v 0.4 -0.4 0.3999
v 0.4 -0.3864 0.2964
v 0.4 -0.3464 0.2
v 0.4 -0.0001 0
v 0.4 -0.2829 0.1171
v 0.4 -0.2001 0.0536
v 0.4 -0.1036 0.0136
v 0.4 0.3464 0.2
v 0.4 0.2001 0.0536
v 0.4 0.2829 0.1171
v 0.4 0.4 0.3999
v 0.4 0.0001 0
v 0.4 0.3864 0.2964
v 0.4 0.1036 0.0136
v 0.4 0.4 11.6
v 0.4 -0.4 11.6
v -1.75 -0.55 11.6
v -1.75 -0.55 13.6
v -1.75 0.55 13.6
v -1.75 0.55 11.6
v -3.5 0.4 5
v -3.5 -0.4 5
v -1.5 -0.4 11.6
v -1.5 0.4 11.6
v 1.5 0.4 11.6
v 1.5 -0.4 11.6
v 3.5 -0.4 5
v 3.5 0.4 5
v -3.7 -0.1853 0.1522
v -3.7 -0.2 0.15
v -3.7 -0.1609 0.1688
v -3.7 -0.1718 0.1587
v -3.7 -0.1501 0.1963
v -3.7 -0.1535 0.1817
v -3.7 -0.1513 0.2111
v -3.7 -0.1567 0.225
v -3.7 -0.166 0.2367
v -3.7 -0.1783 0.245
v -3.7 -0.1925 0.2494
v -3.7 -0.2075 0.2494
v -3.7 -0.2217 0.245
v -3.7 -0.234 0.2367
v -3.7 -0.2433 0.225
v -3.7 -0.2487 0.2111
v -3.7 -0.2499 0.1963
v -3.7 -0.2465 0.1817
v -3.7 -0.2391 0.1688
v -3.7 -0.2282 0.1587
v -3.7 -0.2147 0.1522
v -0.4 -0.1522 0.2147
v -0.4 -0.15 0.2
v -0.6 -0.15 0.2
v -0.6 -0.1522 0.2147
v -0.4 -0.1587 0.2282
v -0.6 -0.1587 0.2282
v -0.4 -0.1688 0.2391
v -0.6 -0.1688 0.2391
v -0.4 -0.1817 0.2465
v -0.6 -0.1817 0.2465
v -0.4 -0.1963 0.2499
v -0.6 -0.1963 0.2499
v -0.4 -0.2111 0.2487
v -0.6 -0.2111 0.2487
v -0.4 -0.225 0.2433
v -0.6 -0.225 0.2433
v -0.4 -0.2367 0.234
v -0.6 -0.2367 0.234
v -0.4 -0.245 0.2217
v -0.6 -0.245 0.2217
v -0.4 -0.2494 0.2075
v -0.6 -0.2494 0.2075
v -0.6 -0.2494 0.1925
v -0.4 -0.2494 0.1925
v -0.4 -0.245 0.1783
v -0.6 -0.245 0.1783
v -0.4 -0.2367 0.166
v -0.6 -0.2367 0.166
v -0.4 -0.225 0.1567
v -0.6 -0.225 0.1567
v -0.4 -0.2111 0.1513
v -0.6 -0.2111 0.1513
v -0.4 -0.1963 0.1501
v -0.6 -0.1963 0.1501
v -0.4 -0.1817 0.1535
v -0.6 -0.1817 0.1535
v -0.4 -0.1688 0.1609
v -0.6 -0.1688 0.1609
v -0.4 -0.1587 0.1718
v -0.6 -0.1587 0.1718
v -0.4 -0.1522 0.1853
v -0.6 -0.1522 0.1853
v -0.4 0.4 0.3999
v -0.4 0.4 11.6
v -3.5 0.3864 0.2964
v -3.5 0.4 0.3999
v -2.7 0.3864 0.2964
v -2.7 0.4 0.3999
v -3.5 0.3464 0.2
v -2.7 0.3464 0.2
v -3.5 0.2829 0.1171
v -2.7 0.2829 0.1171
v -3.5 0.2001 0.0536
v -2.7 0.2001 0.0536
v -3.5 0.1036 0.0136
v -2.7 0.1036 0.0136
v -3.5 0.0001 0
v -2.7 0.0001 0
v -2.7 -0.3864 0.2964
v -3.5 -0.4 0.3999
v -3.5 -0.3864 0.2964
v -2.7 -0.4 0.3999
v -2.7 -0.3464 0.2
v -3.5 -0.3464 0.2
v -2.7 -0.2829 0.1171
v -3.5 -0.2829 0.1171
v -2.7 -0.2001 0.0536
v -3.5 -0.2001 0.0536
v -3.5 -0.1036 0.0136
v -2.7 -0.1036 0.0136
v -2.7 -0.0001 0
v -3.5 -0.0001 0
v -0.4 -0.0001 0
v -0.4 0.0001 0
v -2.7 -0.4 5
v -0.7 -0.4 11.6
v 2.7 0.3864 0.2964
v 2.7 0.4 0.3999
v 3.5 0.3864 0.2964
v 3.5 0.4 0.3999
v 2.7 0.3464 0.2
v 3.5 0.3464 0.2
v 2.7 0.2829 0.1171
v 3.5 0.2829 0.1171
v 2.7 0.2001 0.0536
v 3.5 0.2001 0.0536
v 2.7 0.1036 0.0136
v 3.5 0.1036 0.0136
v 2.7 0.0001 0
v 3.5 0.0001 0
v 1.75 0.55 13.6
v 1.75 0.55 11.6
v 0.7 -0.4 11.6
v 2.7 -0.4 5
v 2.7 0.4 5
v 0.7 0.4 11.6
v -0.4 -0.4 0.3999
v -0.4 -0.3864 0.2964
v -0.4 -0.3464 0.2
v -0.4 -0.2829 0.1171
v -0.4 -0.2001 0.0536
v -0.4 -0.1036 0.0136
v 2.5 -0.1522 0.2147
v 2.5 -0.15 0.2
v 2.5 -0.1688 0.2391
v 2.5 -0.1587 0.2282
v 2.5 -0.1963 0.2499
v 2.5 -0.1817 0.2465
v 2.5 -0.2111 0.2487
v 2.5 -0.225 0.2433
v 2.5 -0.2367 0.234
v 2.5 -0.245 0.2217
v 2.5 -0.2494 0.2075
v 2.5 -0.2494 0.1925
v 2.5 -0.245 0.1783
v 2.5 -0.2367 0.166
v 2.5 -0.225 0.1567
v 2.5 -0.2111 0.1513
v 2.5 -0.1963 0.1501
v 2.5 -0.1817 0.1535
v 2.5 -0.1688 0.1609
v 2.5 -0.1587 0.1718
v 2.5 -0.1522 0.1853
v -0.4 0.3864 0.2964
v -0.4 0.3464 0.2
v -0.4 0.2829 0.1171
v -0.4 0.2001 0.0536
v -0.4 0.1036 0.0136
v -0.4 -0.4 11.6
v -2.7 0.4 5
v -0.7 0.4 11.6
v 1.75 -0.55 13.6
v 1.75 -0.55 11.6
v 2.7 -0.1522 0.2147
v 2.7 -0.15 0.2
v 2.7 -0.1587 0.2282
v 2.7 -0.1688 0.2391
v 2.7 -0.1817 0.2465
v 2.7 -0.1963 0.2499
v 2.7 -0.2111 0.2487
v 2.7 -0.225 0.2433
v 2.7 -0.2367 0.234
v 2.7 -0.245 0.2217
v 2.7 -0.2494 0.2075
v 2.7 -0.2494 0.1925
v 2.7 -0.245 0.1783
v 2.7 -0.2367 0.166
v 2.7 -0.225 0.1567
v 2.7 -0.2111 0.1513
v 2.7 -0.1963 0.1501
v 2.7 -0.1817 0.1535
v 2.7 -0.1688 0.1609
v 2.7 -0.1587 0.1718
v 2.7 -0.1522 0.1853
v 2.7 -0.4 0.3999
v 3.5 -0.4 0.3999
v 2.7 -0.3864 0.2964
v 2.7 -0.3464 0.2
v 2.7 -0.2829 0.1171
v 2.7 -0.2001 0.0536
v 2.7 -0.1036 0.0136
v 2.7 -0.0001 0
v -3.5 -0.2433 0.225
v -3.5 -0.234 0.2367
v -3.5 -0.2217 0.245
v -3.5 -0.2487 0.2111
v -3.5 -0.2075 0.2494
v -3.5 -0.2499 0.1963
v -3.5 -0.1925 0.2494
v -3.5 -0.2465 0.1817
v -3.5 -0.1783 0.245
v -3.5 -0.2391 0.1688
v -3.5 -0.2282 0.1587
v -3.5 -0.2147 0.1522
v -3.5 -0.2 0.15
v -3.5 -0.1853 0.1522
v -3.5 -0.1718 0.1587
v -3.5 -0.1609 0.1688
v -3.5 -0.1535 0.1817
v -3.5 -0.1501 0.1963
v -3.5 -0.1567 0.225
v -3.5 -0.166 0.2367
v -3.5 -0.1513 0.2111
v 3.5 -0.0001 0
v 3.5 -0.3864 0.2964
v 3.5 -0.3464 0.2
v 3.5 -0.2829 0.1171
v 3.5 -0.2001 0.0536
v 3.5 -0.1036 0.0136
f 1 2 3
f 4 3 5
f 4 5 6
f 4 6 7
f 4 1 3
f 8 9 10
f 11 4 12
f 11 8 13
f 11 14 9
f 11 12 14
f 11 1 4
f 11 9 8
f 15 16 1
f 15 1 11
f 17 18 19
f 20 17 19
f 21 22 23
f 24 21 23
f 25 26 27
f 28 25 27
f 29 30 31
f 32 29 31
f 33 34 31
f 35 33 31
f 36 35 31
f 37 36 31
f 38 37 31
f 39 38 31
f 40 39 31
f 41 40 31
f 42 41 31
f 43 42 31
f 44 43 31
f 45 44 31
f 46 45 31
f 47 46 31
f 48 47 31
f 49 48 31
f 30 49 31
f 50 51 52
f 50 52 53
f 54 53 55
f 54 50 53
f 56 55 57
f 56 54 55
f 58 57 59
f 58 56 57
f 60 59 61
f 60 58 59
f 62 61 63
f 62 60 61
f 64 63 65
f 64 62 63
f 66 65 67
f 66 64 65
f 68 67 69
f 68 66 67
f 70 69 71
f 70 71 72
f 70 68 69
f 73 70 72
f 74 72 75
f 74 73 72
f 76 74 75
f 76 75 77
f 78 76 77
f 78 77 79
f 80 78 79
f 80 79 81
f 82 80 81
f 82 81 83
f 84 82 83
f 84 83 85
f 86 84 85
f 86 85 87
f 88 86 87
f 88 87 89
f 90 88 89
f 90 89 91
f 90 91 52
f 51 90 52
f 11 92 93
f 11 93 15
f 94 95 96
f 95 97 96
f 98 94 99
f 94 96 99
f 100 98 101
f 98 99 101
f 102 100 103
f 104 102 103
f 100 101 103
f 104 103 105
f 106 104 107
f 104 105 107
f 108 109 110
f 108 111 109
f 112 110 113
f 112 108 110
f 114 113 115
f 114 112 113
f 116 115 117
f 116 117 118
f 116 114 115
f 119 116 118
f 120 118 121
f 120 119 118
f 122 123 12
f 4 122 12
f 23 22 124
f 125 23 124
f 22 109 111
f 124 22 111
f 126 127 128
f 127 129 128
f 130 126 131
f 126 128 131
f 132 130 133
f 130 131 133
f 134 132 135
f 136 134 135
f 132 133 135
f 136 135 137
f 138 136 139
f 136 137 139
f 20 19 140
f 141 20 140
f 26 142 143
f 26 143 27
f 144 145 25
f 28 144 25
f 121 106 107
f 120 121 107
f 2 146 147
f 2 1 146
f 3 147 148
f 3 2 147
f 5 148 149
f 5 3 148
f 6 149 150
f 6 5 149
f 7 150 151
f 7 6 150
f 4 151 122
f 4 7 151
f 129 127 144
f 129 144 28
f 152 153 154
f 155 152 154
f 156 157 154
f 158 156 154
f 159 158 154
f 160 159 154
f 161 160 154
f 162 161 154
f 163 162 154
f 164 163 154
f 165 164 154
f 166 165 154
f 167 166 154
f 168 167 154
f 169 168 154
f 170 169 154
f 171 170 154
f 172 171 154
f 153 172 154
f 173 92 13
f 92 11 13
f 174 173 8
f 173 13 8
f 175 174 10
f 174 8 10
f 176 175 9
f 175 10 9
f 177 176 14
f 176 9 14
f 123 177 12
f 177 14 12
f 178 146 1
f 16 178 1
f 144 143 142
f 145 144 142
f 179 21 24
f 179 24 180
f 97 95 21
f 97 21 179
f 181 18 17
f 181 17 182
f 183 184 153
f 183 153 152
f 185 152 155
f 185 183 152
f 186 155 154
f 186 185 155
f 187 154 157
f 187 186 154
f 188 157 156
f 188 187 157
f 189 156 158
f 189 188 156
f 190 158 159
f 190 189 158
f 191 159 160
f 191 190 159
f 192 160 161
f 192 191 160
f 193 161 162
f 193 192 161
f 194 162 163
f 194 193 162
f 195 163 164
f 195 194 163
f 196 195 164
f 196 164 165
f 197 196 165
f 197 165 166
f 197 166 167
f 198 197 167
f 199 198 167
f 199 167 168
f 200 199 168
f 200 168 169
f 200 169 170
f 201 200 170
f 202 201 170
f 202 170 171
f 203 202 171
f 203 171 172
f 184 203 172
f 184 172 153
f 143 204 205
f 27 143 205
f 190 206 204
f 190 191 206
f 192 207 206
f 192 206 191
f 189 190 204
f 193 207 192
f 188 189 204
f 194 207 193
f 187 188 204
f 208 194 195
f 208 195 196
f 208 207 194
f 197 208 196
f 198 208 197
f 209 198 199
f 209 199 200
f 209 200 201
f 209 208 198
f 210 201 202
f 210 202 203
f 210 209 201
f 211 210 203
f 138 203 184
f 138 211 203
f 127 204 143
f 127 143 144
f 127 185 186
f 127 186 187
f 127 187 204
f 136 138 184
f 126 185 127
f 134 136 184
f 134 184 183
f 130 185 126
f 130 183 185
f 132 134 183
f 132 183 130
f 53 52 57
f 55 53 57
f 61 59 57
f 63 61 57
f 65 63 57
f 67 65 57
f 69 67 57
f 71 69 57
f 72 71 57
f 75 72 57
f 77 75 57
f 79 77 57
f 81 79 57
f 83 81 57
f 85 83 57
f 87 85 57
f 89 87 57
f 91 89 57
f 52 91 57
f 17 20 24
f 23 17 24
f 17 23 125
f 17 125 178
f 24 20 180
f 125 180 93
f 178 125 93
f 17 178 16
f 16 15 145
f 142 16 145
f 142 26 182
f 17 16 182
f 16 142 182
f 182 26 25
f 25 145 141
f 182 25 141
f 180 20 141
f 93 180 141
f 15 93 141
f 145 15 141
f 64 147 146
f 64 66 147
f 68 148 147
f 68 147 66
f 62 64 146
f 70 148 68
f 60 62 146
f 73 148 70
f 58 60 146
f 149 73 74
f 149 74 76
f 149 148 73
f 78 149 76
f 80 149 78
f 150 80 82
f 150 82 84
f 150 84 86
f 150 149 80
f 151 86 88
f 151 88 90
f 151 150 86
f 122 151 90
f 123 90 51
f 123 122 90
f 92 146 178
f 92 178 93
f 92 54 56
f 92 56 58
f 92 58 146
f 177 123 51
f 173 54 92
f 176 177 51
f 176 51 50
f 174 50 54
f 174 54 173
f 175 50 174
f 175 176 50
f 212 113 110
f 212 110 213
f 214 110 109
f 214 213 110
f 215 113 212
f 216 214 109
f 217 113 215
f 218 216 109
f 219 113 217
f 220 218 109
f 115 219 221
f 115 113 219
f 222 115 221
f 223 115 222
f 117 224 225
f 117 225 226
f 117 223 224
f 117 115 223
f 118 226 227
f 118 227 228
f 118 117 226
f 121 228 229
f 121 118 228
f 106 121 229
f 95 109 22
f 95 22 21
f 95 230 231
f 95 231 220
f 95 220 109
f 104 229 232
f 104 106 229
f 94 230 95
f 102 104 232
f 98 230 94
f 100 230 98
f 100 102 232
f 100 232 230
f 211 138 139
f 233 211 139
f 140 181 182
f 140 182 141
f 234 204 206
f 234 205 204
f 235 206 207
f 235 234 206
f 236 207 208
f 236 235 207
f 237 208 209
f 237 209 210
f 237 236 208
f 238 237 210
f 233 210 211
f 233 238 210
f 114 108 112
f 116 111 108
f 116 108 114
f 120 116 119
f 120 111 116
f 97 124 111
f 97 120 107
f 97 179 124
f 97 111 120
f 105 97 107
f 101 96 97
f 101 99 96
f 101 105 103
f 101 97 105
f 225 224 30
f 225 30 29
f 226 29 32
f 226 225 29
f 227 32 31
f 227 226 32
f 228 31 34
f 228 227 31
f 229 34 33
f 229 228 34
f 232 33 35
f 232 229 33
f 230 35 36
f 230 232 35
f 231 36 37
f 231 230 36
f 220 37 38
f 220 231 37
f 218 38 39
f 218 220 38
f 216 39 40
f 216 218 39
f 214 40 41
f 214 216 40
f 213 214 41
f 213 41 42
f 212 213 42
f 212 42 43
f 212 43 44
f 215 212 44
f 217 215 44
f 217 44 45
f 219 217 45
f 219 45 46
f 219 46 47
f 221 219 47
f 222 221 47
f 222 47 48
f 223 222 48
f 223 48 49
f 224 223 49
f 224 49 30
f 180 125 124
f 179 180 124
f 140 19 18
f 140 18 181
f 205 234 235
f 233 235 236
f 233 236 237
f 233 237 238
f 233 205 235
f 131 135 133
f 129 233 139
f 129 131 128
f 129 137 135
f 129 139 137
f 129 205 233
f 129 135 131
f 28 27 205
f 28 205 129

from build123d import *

# Parameters (mm, degrees)
SKETCH1_W             = 0.8
SKETCH1_H             = 0.8
BOSS_EXTRUDE1_DEPTH   = 13.6
SKETCH2_R             = 0.05
BOSS_EXTRUDE2_DEPTH   = 1
SKETCH3_W             = 3.5
SKETCH3_H             = 1.1
SKETCH3_W_2           = 0.8
SKETCH3_H_2           = 0.8
BOSS_EXTRUDE3_DEPTH   = 2
SKETCH6_W             = 0.8
SKETCH6_H             = 0.8
BOSS_EXTRUDE4_DEPTH   = 5
BOSS_EXTRUDE4_2_DEPTH = 5
SKETCH8_R             = 0.05
BOSS_EXTRUDE5_DEPTH   = 1
SKETCH9_R             = 0.05
BOSS_EXTRUDE6_DEPTH   = 1
LOFT1_START           = -0.4
LOFT1_DEPTH           = 0.8
LOFT2_START           = -0.4
LOFT2_DEPTH           = 0.8
FILLET1_R             = 0.4


# Read off the part's stored shape, not the designer's step: Loft1, Loft2
with BuildPart() as part:
    # Sketch1 → Boss-Extrude1 (new body)
    with BuildSketch(Plane.XY):
        Rectangle(SKETCH1_W, SKETCH1_H)
    extrude(amount=BOSS_EXTRUDE1_DEPTH)

    # Sketch2 → Boss-Extrude2 (add)
    with BuildSketch(Plane(origin=(0.4, 0, 0), x_dir=(0, 0, -1), z_dir=(1, 0, 0))):
        with Locations(Location((-0.2, -0.2, 0), (0, 0, 90))):
            Circle(SKETCH2_R)
    extrude(amount=-BOSS_EXTRUDE2_DEPTH)

    # Sketch3 → Boss-Extrude3 (add)
    # profile 1 of 3: a face of its own
    with BuildSketch(Plane.XY.offset(13.6)):
        Rectangle(SKETCH3_W, SKETCH3_H)
        Rectangle(SKETCH3_W_2, SKETCH3_H_2, mode=Mode.SUBTRACT)
    # profile 2 of 3: a face of its own
    with BuildSketch(Plane.XY.offset(13.6)):
        Rectangle(SKETCH3_W_2, SKETCH3_H_2)
    # profile 3 of 3: a face of its own
    with BuildSketch(Plane.XY.offset(13.6)):
        Rectangle(SKETCH3_W_2, SKETCH3_H_2)
    extrude(amount=-BOSS_EXTRUDE3_DEPTH)



with BuildPart() as body_2:
    # Sketch6 → Boss-Extrude4 (new body)
    with BuildSketch(Plane.XY):
        with Locations((3.1, 0)):
            Rectangle(SKETCH6_W, SKETCH6_H)
    extrude(amount=BOSS_EXTRUDE4_DEPTH)

    # Sketch8 → Boss-Extrude5 (add)
    with BuildSketch(Plane(origin=(3.5, 0, 0), x_dir=(0, 0, -1), z_dir=(1, 0, 0))):
        with Locations(Location((-0.2, -0.2, 0), (0, 0, 90))):
            Circle(SKETCH8_R)
    extrude(amount=-BOSS_EXTRUDE5_DEPTH)


with BuildPart() as body_3:
    # Sketch6 → Boss-Extrude4 2 (new body)
    with BuildSketch(Plane.XY):
        with Locations((-3.1, 0)):
            Rectangle(SKETCH6_W, SKETCH6_H)
    extrude(amount=BOSS_EXTRUDE4_2_DEPTH)

    # Sketch9 → Boss-Extrude6 (add)
    with BuildSketch(Plane(origin=(-2.7, 0, 0), x_dir=(0, 0, -1), z_dir=(1, 0, 0))):
        with Locations((-0.2, -0.2)):
            Circle(SKETCH9_R)
    extrude(amount=-BOSS_EXTRUDE6_DEPTH)


with BuildPart() as part_1:
    add(part.part)

    add(body_2.part)  # Loft1 merges body 2
    # Loft1 outline → Loft1 (add)
    with BuildSketch(Plane(origin=(0, 0, 0), x_dir=(1, 0, 0), z_dir=(0, 1.0, 2.05342141911779e-12)).offset(LOFT1_START)):
        Polygon((0.7, -11.6), (1.5, -11.6), (3.5, -5), (2.7, -5), align=None)
    extrude(amount=LOFT1_DEPTH)


    add(body_3.part)  # Loft2 merges body 3
    # Loft2 outline → Loft2 (add)
    with BuildSketch(Plane(origin=(0, 0, 0), x_dir=(1, 0, 0), z_dir=(0, 1, 0)).offset(LOFT2_START)):
        Polygon((-2.7, -5), (-3.5, -5), (-1.5, -11.6), (-0.7, -11.6), align=None)
    extrude(amount=LOFT2_DEPTH)

    # Fillet1
    fillet1_edges = [part_1.edges().sort_by_distance(p)[0] for p in [
        (-3.1, -0.4, 0),
        (-3.1, 0.4, 0),
        (3.1, -0.4, 0),
        (3.1, 0.4, 0),
        (0, -0.4, 0),
        (0, 0.4, 0),
    ]]
    fillet(fillet1_edges, radius=FILLET1_R - 0.0001)  # a hair under: the kernel refuses the full size


solid = part_1.part
